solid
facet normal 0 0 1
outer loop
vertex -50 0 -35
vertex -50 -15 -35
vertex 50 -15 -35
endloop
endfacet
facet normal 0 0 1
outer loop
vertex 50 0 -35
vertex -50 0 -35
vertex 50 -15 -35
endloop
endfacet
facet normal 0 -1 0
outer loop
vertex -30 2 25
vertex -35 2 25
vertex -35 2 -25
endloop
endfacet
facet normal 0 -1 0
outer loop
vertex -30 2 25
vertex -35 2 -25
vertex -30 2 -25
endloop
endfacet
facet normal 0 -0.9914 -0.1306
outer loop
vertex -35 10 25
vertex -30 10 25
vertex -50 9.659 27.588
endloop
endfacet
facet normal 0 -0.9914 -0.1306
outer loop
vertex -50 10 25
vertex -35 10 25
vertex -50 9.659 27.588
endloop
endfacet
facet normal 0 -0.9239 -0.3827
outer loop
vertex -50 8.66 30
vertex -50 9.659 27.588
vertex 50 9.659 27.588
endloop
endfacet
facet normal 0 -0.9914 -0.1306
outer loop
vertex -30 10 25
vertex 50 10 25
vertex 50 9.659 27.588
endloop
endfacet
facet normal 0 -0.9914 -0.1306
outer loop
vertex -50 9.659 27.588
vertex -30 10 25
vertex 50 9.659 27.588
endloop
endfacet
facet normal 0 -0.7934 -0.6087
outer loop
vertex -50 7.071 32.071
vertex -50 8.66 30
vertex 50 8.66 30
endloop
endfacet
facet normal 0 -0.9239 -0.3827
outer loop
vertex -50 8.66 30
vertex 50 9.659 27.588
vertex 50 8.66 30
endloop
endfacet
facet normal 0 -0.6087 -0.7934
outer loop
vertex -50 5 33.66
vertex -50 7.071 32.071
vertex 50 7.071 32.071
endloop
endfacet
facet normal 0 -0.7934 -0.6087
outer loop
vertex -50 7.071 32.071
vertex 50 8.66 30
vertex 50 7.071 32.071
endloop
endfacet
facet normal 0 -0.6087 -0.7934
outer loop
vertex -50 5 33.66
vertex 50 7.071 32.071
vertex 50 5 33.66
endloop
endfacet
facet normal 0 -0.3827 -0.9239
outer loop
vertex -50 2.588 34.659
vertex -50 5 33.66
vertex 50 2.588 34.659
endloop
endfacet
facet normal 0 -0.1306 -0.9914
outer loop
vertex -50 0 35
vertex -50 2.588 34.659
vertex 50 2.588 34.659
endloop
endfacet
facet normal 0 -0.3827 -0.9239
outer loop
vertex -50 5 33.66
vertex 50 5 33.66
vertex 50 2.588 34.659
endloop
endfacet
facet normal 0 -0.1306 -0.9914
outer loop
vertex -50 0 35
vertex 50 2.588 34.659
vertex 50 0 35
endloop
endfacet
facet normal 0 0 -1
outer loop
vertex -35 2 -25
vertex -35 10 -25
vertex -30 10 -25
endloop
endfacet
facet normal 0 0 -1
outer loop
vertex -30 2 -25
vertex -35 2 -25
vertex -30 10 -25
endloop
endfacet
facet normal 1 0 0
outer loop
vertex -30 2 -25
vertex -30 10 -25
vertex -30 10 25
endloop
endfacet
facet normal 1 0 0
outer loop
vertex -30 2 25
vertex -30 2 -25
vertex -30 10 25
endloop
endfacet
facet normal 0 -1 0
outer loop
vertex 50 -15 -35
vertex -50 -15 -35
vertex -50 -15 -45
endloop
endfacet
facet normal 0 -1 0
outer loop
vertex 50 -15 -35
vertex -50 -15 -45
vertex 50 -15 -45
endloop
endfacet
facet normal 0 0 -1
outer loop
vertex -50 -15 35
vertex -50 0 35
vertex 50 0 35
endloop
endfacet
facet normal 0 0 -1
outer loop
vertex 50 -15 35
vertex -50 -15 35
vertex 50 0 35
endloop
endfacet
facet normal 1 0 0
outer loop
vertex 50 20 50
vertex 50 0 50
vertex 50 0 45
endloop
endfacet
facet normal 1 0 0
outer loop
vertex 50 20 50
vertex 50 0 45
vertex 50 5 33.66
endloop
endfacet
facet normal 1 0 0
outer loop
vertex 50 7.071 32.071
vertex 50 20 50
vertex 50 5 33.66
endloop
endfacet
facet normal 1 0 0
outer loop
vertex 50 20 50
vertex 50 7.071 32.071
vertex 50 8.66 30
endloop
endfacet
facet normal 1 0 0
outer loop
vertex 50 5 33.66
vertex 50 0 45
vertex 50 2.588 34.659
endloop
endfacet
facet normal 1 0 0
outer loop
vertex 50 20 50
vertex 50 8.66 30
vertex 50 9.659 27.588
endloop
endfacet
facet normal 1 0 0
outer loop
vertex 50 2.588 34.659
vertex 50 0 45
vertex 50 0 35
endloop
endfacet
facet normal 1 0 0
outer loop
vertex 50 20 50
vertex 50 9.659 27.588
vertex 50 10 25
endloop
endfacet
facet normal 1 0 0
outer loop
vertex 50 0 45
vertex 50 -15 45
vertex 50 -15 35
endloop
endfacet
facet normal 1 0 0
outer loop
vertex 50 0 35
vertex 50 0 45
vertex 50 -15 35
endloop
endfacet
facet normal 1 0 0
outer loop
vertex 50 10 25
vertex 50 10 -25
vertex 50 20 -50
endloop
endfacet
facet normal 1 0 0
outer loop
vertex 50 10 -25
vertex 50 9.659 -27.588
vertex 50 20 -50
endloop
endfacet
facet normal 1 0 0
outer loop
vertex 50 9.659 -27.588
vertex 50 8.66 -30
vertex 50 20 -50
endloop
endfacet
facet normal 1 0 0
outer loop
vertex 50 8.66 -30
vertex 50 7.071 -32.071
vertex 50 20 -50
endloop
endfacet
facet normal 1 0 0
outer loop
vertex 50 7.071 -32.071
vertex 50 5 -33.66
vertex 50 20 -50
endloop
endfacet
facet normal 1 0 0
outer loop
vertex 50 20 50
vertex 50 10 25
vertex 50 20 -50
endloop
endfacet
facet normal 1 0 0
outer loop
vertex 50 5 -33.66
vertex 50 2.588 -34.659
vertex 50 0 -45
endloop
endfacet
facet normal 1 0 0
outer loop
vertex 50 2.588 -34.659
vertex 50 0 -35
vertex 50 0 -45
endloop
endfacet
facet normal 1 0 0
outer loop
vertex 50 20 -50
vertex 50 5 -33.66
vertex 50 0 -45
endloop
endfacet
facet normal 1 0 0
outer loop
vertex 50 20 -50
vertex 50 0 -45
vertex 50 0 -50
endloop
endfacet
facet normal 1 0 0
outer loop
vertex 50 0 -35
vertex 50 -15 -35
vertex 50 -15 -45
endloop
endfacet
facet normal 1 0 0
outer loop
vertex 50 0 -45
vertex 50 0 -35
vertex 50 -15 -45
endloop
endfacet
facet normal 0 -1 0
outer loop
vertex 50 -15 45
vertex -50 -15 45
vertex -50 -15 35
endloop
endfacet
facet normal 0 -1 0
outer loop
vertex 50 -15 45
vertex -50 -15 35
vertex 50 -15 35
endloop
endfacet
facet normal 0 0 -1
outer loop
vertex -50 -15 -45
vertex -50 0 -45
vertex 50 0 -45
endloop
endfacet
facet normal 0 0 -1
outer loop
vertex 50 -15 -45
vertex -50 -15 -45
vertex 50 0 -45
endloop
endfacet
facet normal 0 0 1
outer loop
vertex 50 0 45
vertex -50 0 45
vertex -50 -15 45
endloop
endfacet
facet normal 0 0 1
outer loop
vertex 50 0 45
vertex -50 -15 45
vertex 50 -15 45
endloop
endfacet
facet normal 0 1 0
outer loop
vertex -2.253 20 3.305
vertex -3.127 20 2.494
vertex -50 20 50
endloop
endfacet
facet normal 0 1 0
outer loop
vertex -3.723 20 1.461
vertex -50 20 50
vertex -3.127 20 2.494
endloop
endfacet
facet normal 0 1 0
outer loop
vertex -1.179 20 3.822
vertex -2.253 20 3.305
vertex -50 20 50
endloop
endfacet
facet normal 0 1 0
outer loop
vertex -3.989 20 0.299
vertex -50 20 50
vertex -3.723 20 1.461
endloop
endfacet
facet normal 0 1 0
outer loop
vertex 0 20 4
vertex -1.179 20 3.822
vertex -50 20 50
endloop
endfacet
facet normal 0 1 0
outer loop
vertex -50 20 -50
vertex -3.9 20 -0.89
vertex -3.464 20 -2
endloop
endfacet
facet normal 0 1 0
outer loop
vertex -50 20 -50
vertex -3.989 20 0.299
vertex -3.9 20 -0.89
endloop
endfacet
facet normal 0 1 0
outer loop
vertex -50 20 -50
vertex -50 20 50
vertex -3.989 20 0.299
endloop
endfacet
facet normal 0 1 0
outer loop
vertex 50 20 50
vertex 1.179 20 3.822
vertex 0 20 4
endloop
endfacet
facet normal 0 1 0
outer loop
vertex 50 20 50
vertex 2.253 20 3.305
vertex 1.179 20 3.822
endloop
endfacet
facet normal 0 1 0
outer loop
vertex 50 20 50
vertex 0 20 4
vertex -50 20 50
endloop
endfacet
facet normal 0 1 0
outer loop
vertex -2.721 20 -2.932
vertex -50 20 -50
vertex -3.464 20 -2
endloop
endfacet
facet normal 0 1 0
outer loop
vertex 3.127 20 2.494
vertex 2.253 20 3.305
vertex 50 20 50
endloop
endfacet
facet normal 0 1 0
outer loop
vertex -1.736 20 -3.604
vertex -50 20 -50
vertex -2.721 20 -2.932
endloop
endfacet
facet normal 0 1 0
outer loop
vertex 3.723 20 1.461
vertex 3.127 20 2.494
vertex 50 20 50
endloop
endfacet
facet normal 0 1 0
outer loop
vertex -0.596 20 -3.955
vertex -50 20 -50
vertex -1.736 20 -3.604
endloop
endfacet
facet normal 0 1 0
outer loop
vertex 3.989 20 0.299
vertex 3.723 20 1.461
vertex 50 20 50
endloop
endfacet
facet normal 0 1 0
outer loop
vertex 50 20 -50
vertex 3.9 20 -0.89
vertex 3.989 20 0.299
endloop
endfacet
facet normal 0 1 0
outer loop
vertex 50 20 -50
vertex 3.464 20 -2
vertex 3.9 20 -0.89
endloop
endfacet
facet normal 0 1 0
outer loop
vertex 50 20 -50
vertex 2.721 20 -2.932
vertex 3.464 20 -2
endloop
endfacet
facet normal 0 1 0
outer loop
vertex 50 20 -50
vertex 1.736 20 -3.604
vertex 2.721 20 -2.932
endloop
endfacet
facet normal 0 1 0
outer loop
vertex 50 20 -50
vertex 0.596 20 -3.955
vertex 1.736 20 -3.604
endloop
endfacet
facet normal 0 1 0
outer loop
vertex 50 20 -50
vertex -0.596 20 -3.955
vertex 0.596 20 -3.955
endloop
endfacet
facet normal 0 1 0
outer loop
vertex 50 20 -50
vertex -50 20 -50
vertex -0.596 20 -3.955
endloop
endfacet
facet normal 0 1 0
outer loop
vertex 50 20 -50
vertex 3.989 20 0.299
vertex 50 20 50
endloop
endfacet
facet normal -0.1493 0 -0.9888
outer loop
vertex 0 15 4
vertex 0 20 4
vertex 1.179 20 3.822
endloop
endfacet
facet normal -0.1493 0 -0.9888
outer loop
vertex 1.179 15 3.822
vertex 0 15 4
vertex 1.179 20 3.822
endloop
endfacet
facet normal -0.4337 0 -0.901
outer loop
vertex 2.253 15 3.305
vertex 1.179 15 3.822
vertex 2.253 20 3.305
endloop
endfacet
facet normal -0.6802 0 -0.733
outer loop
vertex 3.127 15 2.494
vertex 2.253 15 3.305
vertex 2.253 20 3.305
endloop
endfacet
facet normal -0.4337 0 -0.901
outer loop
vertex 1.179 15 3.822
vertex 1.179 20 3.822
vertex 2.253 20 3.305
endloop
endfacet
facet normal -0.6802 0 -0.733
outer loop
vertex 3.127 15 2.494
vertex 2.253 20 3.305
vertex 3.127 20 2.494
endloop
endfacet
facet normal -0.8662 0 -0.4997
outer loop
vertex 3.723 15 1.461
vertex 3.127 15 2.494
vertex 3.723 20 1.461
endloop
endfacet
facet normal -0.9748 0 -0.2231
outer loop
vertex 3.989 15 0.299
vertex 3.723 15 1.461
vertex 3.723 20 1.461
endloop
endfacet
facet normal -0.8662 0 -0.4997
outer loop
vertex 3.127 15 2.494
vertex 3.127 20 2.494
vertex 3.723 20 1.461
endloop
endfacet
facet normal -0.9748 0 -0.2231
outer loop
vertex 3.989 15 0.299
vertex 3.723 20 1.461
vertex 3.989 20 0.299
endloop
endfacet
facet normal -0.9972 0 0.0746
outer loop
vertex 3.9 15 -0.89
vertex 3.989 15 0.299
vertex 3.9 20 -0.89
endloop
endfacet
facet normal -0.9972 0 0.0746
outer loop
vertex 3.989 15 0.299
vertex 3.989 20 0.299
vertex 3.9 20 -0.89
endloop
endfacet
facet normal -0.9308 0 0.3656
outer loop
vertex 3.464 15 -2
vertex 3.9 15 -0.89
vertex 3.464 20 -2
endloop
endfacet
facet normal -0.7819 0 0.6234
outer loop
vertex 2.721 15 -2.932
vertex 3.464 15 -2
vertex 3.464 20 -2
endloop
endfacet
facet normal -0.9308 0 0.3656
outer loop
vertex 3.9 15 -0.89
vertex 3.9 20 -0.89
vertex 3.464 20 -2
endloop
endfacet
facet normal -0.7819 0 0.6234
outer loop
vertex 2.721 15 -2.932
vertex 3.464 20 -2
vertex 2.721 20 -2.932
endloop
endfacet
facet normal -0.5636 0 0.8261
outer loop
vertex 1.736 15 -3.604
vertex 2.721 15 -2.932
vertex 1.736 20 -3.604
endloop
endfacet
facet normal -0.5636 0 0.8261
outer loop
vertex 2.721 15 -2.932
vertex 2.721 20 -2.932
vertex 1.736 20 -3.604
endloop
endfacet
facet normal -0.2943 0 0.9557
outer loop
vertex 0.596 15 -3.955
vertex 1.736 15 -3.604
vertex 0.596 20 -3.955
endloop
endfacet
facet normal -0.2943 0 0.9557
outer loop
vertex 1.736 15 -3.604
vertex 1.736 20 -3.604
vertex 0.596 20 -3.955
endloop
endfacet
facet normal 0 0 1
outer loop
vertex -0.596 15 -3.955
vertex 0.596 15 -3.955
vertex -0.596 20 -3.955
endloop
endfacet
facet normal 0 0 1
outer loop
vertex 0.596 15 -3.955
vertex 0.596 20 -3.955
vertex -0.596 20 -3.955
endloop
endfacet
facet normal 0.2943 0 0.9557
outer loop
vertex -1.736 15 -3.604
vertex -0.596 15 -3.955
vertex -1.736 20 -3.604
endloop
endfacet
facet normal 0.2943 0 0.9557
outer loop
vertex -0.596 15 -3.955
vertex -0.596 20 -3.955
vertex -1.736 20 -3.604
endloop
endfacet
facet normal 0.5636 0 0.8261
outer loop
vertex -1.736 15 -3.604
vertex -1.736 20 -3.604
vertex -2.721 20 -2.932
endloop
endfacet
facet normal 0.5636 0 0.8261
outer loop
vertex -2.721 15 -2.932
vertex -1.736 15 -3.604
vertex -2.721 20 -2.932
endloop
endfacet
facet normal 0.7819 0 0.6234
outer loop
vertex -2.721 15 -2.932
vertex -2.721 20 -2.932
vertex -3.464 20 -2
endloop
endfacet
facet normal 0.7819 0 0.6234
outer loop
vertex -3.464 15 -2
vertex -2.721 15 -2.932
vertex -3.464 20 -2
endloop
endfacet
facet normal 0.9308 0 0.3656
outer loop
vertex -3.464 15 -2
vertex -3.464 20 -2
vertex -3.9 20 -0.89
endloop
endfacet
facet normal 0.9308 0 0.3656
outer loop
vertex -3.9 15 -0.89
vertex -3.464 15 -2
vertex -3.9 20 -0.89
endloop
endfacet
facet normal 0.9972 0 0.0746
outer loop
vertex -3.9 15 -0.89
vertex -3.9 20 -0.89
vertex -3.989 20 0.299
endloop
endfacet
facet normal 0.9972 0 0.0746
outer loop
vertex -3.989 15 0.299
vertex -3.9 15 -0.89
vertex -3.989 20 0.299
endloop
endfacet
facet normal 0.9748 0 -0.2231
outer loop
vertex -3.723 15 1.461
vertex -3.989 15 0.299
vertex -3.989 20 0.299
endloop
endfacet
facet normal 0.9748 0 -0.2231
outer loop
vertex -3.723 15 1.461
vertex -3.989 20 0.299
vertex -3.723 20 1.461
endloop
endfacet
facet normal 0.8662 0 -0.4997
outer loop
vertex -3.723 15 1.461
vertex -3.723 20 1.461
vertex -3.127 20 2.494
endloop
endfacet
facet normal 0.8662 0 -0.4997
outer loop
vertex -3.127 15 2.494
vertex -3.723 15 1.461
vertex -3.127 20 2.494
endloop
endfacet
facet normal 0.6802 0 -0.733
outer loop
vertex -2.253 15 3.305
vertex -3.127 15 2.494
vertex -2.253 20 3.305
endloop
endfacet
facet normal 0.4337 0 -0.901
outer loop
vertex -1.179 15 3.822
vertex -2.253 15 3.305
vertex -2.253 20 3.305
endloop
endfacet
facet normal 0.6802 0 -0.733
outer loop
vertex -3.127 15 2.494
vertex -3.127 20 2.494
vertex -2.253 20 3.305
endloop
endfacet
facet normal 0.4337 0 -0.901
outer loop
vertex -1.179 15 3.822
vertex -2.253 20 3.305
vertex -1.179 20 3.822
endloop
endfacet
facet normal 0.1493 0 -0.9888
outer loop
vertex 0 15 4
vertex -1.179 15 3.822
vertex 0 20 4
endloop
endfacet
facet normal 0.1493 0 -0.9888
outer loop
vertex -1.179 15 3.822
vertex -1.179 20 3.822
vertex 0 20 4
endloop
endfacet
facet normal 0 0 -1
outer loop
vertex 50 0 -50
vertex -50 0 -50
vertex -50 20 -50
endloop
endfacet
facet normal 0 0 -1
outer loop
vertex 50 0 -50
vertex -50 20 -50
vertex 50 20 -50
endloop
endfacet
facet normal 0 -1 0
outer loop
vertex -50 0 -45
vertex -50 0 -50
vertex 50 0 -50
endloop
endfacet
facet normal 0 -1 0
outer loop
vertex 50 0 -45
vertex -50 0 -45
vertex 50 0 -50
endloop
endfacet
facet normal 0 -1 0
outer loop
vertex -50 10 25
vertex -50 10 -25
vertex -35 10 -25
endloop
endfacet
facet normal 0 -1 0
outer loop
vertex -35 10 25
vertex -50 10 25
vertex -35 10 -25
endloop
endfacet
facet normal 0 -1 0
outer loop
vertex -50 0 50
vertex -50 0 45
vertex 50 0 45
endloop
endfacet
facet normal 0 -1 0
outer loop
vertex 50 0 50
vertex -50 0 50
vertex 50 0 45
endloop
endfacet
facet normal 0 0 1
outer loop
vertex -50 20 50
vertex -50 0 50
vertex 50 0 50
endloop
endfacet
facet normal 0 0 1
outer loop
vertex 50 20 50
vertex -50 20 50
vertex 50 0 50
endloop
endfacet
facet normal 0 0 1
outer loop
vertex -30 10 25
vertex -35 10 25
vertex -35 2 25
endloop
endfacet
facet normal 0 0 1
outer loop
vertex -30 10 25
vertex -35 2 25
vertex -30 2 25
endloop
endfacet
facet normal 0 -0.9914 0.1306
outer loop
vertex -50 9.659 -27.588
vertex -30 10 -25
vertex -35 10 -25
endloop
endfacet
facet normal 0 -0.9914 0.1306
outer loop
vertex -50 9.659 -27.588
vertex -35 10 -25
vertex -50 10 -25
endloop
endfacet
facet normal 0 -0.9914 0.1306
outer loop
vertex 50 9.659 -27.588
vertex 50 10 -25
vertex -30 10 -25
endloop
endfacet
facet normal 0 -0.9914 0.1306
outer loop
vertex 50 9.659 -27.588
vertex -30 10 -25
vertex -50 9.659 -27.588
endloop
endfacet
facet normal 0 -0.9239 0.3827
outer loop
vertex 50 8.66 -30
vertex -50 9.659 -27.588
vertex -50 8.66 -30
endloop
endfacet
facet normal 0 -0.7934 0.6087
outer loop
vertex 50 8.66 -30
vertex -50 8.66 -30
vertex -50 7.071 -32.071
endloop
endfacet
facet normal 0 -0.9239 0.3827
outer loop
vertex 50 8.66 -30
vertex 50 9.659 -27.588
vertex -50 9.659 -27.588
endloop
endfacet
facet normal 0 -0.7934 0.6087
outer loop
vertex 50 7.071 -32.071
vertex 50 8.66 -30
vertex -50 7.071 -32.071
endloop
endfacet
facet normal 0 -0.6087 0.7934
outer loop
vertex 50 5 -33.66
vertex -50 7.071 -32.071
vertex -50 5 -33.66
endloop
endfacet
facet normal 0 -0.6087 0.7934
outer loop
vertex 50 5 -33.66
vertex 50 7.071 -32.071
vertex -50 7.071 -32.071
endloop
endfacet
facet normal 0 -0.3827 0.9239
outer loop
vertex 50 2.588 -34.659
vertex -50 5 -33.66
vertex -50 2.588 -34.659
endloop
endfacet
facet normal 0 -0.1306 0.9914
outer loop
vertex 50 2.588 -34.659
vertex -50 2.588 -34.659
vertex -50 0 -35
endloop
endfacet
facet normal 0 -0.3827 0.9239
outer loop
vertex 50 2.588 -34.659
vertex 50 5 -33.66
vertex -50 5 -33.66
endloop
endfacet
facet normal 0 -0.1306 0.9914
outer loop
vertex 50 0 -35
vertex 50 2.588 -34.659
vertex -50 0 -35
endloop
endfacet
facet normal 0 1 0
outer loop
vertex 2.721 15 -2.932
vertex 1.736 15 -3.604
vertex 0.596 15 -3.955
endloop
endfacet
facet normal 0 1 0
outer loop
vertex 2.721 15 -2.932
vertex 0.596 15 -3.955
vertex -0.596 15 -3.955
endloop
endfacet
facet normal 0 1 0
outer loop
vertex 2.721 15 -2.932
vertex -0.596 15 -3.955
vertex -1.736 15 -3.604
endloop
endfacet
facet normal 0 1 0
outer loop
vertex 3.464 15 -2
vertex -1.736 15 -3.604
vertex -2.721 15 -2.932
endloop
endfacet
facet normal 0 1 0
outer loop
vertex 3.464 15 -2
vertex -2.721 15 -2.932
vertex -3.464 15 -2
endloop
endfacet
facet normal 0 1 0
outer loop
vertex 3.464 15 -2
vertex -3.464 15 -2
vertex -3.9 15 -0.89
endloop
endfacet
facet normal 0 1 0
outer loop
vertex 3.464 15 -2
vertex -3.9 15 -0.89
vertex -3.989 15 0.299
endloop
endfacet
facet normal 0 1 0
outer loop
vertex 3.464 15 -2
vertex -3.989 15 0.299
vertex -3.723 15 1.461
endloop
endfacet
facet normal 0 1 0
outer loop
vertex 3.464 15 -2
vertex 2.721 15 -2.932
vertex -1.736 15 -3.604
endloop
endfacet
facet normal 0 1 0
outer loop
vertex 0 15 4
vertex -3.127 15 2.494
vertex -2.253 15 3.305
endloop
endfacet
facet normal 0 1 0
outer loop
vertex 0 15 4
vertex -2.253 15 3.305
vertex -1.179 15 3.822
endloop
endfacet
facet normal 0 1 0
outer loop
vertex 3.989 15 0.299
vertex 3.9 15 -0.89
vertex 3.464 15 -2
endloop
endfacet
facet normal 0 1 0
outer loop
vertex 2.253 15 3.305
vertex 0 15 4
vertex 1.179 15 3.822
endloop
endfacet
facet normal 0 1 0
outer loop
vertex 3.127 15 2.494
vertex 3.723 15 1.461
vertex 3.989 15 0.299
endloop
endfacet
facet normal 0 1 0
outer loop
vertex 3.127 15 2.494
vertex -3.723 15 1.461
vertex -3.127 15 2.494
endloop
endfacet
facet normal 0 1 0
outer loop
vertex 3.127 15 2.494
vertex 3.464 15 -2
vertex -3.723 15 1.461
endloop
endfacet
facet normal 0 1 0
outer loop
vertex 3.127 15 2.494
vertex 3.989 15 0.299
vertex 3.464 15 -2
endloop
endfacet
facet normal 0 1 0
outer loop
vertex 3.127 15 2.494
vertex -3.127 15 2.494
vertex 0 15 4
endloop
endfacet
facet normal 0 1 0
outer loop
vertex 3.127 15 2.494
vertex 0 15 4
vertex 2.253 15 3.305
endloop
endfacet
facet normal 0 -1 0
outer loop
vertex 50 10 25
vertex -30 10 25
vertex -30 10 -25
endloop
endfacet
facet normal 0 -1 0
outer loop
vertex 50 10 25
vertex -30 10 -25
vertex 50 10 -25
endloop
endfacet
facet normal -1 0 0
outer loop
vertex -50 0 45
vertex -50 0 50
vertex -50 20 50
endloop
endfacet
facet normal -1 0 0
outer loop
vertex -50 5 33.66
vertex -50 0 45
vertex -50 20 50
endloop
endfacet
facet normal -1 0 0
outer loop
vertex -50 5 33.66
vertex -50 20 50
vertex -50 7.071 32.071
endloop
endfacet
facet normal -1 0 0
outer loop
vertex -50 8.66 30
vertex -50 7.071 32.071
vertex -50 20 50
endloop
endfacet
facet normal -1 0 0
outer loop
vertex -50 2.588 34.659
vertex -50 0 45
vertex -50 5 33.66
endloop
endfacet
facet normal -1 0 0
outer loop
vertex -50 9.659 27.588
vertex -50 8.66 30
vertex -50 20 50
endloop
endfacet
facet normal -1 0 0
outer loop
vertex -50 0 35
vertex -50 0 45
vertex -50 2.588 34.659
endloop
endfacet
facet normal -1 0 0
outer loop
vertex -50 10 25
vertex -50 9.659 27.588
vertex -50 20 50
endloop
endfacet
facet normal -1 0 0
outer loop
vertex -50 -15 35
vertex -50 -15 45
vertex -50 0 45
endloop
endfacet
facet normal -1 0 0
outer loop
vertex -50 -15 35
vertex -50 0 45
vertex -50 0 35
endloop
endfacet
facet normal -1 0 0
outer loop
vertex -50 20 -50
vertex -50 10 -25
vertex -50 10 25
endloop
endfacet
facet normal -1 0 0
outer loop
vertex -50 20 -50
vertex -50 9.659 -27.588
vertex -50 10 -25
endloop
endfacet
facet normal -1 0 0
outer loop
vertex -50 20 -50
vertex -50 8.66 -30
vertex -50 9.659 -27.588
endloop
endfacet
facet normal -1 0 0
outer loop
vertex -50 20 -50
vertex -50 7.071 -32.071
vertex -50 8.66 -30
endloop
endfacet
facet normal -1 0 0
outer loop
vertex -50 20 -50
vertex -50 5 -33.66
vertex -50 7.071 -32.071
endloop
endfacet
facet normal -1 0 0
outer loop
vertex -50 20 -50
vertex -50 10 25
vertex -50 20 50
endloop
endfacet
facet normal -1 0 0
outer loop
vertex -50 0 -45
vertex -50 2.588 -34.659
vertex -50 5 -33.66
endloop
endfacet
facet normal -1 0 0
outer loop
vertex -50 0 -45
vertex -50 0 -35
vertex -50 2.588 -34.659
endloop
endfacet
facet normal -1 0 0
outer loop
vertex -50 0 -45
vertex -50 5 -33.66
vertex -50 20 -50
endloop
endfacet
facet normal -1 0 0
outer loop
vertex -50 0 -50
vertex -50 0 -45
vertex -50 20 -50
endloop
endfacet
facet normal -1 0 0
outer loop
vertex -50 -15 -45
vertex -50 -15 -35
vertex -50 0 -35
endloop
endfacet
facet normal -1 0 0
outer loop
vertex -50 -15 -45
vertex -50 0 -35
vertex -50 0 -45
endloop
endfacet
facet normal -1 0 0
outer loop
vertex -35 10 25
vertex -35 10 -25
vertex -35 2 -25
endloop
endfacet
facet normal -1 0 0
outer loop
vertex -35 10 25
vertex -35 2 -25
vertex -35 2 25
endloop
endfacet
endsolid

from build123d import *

# Parameters (mm, degrees)
SKETCH1_W           = 100
SKETCH1_H           = 100
BOSS_EXTRUDE1_DEPTH = 20
SKETCH3_R           = 4
CUT_EXTRUDE1_DEPTH  = 5
SKETCH4_W           = 100
SKETCH4_H           = 10
BOSS_EXTRUDE2_DEPTH = 15
SKETCH5_W           = 100
SKETCH5_H           = 70
CUT_EXTRUDE2_DEPTH  = 10
FILLET2_R           = 10
FILLET3_R           = 10
SKETCH6_W           = 5
SKETCH6_H           = 50
BOSS_EXTRUDE3_DEPTH = 8


with BuildPart() as part:
    # Sketch1 → Boss-Extrude1 (new body)
    with BuildSketch(Plane(origin=(0, 0, 0), x_dir=(1, 0, 0), z_dir=(0, 1, 0))):
        Rectangle(SKETCH1_W, SKETCH1_H)
    extrude(amount=BOSS_EXTRUDE1_DEPTH)

    # Sketch3 → Cut-Extrude1 (cut)
    with BuildSketch(Plane(origin=(0, 20, 0), x_dir=(1, 0, 0), z_dir=(0, 1, 0))):
        with Locations(Location((0, 0, 0), (0, 0, 270))):
            Circle(SKETCH3_R)
    extrude(amount=-CUT_EXTRUDE1_DEPTH, mode=Mode.SUBTRACT)

    # Sketch4 → Boss-Extrude2 (add)
    with BuildSketch(Plane.XZ):
        with Locations((0, -40)):
            Rectangle(SKETCH4_W, SKETCH4_H)
        with Locations((0, 40)):
            Rectangle(SKETCH4_W, SKETCH4_H)
    extrude(amount=BOSS_EXTRUDE2_DEPTH)

    # Sketch5 → Cut-Extrude2 (cut)
    with BuildSketch(Plane.XZ):
        Rectangle(SKETCH5_W, SKETCH5_H)
    extrude(amount=-CUT_EXTRUDE2_DEPTH, mode=Mode.SUBTRACT)

    # Fillet2
    fillet2_edges = [part.edges().sort_by_distance(p)[0] for p in [
        (0, 10, -35),
    ]]
    fillet(fillet2_edges, radius=FILLET2_R)

    # Fillet3
    fillet3_edges = [part.edges().sort_by_distance(p)[0] for p in [
        (0, 10, 35),
    ]]
    fillet(fillet3_edges, radius=FILLET3_R)

    # Sketch6 → Boss-Extrude3 (add)
    with BuildSketch(Plane.XZ.offset(-10)):
        with Locations((-32.5, 0)):
            Rectangle(SKETCH6_W, SKETCH6_H)
    extrude(amount=BOSS_EXTRUDE3_DEPTH)


solid = part.part
